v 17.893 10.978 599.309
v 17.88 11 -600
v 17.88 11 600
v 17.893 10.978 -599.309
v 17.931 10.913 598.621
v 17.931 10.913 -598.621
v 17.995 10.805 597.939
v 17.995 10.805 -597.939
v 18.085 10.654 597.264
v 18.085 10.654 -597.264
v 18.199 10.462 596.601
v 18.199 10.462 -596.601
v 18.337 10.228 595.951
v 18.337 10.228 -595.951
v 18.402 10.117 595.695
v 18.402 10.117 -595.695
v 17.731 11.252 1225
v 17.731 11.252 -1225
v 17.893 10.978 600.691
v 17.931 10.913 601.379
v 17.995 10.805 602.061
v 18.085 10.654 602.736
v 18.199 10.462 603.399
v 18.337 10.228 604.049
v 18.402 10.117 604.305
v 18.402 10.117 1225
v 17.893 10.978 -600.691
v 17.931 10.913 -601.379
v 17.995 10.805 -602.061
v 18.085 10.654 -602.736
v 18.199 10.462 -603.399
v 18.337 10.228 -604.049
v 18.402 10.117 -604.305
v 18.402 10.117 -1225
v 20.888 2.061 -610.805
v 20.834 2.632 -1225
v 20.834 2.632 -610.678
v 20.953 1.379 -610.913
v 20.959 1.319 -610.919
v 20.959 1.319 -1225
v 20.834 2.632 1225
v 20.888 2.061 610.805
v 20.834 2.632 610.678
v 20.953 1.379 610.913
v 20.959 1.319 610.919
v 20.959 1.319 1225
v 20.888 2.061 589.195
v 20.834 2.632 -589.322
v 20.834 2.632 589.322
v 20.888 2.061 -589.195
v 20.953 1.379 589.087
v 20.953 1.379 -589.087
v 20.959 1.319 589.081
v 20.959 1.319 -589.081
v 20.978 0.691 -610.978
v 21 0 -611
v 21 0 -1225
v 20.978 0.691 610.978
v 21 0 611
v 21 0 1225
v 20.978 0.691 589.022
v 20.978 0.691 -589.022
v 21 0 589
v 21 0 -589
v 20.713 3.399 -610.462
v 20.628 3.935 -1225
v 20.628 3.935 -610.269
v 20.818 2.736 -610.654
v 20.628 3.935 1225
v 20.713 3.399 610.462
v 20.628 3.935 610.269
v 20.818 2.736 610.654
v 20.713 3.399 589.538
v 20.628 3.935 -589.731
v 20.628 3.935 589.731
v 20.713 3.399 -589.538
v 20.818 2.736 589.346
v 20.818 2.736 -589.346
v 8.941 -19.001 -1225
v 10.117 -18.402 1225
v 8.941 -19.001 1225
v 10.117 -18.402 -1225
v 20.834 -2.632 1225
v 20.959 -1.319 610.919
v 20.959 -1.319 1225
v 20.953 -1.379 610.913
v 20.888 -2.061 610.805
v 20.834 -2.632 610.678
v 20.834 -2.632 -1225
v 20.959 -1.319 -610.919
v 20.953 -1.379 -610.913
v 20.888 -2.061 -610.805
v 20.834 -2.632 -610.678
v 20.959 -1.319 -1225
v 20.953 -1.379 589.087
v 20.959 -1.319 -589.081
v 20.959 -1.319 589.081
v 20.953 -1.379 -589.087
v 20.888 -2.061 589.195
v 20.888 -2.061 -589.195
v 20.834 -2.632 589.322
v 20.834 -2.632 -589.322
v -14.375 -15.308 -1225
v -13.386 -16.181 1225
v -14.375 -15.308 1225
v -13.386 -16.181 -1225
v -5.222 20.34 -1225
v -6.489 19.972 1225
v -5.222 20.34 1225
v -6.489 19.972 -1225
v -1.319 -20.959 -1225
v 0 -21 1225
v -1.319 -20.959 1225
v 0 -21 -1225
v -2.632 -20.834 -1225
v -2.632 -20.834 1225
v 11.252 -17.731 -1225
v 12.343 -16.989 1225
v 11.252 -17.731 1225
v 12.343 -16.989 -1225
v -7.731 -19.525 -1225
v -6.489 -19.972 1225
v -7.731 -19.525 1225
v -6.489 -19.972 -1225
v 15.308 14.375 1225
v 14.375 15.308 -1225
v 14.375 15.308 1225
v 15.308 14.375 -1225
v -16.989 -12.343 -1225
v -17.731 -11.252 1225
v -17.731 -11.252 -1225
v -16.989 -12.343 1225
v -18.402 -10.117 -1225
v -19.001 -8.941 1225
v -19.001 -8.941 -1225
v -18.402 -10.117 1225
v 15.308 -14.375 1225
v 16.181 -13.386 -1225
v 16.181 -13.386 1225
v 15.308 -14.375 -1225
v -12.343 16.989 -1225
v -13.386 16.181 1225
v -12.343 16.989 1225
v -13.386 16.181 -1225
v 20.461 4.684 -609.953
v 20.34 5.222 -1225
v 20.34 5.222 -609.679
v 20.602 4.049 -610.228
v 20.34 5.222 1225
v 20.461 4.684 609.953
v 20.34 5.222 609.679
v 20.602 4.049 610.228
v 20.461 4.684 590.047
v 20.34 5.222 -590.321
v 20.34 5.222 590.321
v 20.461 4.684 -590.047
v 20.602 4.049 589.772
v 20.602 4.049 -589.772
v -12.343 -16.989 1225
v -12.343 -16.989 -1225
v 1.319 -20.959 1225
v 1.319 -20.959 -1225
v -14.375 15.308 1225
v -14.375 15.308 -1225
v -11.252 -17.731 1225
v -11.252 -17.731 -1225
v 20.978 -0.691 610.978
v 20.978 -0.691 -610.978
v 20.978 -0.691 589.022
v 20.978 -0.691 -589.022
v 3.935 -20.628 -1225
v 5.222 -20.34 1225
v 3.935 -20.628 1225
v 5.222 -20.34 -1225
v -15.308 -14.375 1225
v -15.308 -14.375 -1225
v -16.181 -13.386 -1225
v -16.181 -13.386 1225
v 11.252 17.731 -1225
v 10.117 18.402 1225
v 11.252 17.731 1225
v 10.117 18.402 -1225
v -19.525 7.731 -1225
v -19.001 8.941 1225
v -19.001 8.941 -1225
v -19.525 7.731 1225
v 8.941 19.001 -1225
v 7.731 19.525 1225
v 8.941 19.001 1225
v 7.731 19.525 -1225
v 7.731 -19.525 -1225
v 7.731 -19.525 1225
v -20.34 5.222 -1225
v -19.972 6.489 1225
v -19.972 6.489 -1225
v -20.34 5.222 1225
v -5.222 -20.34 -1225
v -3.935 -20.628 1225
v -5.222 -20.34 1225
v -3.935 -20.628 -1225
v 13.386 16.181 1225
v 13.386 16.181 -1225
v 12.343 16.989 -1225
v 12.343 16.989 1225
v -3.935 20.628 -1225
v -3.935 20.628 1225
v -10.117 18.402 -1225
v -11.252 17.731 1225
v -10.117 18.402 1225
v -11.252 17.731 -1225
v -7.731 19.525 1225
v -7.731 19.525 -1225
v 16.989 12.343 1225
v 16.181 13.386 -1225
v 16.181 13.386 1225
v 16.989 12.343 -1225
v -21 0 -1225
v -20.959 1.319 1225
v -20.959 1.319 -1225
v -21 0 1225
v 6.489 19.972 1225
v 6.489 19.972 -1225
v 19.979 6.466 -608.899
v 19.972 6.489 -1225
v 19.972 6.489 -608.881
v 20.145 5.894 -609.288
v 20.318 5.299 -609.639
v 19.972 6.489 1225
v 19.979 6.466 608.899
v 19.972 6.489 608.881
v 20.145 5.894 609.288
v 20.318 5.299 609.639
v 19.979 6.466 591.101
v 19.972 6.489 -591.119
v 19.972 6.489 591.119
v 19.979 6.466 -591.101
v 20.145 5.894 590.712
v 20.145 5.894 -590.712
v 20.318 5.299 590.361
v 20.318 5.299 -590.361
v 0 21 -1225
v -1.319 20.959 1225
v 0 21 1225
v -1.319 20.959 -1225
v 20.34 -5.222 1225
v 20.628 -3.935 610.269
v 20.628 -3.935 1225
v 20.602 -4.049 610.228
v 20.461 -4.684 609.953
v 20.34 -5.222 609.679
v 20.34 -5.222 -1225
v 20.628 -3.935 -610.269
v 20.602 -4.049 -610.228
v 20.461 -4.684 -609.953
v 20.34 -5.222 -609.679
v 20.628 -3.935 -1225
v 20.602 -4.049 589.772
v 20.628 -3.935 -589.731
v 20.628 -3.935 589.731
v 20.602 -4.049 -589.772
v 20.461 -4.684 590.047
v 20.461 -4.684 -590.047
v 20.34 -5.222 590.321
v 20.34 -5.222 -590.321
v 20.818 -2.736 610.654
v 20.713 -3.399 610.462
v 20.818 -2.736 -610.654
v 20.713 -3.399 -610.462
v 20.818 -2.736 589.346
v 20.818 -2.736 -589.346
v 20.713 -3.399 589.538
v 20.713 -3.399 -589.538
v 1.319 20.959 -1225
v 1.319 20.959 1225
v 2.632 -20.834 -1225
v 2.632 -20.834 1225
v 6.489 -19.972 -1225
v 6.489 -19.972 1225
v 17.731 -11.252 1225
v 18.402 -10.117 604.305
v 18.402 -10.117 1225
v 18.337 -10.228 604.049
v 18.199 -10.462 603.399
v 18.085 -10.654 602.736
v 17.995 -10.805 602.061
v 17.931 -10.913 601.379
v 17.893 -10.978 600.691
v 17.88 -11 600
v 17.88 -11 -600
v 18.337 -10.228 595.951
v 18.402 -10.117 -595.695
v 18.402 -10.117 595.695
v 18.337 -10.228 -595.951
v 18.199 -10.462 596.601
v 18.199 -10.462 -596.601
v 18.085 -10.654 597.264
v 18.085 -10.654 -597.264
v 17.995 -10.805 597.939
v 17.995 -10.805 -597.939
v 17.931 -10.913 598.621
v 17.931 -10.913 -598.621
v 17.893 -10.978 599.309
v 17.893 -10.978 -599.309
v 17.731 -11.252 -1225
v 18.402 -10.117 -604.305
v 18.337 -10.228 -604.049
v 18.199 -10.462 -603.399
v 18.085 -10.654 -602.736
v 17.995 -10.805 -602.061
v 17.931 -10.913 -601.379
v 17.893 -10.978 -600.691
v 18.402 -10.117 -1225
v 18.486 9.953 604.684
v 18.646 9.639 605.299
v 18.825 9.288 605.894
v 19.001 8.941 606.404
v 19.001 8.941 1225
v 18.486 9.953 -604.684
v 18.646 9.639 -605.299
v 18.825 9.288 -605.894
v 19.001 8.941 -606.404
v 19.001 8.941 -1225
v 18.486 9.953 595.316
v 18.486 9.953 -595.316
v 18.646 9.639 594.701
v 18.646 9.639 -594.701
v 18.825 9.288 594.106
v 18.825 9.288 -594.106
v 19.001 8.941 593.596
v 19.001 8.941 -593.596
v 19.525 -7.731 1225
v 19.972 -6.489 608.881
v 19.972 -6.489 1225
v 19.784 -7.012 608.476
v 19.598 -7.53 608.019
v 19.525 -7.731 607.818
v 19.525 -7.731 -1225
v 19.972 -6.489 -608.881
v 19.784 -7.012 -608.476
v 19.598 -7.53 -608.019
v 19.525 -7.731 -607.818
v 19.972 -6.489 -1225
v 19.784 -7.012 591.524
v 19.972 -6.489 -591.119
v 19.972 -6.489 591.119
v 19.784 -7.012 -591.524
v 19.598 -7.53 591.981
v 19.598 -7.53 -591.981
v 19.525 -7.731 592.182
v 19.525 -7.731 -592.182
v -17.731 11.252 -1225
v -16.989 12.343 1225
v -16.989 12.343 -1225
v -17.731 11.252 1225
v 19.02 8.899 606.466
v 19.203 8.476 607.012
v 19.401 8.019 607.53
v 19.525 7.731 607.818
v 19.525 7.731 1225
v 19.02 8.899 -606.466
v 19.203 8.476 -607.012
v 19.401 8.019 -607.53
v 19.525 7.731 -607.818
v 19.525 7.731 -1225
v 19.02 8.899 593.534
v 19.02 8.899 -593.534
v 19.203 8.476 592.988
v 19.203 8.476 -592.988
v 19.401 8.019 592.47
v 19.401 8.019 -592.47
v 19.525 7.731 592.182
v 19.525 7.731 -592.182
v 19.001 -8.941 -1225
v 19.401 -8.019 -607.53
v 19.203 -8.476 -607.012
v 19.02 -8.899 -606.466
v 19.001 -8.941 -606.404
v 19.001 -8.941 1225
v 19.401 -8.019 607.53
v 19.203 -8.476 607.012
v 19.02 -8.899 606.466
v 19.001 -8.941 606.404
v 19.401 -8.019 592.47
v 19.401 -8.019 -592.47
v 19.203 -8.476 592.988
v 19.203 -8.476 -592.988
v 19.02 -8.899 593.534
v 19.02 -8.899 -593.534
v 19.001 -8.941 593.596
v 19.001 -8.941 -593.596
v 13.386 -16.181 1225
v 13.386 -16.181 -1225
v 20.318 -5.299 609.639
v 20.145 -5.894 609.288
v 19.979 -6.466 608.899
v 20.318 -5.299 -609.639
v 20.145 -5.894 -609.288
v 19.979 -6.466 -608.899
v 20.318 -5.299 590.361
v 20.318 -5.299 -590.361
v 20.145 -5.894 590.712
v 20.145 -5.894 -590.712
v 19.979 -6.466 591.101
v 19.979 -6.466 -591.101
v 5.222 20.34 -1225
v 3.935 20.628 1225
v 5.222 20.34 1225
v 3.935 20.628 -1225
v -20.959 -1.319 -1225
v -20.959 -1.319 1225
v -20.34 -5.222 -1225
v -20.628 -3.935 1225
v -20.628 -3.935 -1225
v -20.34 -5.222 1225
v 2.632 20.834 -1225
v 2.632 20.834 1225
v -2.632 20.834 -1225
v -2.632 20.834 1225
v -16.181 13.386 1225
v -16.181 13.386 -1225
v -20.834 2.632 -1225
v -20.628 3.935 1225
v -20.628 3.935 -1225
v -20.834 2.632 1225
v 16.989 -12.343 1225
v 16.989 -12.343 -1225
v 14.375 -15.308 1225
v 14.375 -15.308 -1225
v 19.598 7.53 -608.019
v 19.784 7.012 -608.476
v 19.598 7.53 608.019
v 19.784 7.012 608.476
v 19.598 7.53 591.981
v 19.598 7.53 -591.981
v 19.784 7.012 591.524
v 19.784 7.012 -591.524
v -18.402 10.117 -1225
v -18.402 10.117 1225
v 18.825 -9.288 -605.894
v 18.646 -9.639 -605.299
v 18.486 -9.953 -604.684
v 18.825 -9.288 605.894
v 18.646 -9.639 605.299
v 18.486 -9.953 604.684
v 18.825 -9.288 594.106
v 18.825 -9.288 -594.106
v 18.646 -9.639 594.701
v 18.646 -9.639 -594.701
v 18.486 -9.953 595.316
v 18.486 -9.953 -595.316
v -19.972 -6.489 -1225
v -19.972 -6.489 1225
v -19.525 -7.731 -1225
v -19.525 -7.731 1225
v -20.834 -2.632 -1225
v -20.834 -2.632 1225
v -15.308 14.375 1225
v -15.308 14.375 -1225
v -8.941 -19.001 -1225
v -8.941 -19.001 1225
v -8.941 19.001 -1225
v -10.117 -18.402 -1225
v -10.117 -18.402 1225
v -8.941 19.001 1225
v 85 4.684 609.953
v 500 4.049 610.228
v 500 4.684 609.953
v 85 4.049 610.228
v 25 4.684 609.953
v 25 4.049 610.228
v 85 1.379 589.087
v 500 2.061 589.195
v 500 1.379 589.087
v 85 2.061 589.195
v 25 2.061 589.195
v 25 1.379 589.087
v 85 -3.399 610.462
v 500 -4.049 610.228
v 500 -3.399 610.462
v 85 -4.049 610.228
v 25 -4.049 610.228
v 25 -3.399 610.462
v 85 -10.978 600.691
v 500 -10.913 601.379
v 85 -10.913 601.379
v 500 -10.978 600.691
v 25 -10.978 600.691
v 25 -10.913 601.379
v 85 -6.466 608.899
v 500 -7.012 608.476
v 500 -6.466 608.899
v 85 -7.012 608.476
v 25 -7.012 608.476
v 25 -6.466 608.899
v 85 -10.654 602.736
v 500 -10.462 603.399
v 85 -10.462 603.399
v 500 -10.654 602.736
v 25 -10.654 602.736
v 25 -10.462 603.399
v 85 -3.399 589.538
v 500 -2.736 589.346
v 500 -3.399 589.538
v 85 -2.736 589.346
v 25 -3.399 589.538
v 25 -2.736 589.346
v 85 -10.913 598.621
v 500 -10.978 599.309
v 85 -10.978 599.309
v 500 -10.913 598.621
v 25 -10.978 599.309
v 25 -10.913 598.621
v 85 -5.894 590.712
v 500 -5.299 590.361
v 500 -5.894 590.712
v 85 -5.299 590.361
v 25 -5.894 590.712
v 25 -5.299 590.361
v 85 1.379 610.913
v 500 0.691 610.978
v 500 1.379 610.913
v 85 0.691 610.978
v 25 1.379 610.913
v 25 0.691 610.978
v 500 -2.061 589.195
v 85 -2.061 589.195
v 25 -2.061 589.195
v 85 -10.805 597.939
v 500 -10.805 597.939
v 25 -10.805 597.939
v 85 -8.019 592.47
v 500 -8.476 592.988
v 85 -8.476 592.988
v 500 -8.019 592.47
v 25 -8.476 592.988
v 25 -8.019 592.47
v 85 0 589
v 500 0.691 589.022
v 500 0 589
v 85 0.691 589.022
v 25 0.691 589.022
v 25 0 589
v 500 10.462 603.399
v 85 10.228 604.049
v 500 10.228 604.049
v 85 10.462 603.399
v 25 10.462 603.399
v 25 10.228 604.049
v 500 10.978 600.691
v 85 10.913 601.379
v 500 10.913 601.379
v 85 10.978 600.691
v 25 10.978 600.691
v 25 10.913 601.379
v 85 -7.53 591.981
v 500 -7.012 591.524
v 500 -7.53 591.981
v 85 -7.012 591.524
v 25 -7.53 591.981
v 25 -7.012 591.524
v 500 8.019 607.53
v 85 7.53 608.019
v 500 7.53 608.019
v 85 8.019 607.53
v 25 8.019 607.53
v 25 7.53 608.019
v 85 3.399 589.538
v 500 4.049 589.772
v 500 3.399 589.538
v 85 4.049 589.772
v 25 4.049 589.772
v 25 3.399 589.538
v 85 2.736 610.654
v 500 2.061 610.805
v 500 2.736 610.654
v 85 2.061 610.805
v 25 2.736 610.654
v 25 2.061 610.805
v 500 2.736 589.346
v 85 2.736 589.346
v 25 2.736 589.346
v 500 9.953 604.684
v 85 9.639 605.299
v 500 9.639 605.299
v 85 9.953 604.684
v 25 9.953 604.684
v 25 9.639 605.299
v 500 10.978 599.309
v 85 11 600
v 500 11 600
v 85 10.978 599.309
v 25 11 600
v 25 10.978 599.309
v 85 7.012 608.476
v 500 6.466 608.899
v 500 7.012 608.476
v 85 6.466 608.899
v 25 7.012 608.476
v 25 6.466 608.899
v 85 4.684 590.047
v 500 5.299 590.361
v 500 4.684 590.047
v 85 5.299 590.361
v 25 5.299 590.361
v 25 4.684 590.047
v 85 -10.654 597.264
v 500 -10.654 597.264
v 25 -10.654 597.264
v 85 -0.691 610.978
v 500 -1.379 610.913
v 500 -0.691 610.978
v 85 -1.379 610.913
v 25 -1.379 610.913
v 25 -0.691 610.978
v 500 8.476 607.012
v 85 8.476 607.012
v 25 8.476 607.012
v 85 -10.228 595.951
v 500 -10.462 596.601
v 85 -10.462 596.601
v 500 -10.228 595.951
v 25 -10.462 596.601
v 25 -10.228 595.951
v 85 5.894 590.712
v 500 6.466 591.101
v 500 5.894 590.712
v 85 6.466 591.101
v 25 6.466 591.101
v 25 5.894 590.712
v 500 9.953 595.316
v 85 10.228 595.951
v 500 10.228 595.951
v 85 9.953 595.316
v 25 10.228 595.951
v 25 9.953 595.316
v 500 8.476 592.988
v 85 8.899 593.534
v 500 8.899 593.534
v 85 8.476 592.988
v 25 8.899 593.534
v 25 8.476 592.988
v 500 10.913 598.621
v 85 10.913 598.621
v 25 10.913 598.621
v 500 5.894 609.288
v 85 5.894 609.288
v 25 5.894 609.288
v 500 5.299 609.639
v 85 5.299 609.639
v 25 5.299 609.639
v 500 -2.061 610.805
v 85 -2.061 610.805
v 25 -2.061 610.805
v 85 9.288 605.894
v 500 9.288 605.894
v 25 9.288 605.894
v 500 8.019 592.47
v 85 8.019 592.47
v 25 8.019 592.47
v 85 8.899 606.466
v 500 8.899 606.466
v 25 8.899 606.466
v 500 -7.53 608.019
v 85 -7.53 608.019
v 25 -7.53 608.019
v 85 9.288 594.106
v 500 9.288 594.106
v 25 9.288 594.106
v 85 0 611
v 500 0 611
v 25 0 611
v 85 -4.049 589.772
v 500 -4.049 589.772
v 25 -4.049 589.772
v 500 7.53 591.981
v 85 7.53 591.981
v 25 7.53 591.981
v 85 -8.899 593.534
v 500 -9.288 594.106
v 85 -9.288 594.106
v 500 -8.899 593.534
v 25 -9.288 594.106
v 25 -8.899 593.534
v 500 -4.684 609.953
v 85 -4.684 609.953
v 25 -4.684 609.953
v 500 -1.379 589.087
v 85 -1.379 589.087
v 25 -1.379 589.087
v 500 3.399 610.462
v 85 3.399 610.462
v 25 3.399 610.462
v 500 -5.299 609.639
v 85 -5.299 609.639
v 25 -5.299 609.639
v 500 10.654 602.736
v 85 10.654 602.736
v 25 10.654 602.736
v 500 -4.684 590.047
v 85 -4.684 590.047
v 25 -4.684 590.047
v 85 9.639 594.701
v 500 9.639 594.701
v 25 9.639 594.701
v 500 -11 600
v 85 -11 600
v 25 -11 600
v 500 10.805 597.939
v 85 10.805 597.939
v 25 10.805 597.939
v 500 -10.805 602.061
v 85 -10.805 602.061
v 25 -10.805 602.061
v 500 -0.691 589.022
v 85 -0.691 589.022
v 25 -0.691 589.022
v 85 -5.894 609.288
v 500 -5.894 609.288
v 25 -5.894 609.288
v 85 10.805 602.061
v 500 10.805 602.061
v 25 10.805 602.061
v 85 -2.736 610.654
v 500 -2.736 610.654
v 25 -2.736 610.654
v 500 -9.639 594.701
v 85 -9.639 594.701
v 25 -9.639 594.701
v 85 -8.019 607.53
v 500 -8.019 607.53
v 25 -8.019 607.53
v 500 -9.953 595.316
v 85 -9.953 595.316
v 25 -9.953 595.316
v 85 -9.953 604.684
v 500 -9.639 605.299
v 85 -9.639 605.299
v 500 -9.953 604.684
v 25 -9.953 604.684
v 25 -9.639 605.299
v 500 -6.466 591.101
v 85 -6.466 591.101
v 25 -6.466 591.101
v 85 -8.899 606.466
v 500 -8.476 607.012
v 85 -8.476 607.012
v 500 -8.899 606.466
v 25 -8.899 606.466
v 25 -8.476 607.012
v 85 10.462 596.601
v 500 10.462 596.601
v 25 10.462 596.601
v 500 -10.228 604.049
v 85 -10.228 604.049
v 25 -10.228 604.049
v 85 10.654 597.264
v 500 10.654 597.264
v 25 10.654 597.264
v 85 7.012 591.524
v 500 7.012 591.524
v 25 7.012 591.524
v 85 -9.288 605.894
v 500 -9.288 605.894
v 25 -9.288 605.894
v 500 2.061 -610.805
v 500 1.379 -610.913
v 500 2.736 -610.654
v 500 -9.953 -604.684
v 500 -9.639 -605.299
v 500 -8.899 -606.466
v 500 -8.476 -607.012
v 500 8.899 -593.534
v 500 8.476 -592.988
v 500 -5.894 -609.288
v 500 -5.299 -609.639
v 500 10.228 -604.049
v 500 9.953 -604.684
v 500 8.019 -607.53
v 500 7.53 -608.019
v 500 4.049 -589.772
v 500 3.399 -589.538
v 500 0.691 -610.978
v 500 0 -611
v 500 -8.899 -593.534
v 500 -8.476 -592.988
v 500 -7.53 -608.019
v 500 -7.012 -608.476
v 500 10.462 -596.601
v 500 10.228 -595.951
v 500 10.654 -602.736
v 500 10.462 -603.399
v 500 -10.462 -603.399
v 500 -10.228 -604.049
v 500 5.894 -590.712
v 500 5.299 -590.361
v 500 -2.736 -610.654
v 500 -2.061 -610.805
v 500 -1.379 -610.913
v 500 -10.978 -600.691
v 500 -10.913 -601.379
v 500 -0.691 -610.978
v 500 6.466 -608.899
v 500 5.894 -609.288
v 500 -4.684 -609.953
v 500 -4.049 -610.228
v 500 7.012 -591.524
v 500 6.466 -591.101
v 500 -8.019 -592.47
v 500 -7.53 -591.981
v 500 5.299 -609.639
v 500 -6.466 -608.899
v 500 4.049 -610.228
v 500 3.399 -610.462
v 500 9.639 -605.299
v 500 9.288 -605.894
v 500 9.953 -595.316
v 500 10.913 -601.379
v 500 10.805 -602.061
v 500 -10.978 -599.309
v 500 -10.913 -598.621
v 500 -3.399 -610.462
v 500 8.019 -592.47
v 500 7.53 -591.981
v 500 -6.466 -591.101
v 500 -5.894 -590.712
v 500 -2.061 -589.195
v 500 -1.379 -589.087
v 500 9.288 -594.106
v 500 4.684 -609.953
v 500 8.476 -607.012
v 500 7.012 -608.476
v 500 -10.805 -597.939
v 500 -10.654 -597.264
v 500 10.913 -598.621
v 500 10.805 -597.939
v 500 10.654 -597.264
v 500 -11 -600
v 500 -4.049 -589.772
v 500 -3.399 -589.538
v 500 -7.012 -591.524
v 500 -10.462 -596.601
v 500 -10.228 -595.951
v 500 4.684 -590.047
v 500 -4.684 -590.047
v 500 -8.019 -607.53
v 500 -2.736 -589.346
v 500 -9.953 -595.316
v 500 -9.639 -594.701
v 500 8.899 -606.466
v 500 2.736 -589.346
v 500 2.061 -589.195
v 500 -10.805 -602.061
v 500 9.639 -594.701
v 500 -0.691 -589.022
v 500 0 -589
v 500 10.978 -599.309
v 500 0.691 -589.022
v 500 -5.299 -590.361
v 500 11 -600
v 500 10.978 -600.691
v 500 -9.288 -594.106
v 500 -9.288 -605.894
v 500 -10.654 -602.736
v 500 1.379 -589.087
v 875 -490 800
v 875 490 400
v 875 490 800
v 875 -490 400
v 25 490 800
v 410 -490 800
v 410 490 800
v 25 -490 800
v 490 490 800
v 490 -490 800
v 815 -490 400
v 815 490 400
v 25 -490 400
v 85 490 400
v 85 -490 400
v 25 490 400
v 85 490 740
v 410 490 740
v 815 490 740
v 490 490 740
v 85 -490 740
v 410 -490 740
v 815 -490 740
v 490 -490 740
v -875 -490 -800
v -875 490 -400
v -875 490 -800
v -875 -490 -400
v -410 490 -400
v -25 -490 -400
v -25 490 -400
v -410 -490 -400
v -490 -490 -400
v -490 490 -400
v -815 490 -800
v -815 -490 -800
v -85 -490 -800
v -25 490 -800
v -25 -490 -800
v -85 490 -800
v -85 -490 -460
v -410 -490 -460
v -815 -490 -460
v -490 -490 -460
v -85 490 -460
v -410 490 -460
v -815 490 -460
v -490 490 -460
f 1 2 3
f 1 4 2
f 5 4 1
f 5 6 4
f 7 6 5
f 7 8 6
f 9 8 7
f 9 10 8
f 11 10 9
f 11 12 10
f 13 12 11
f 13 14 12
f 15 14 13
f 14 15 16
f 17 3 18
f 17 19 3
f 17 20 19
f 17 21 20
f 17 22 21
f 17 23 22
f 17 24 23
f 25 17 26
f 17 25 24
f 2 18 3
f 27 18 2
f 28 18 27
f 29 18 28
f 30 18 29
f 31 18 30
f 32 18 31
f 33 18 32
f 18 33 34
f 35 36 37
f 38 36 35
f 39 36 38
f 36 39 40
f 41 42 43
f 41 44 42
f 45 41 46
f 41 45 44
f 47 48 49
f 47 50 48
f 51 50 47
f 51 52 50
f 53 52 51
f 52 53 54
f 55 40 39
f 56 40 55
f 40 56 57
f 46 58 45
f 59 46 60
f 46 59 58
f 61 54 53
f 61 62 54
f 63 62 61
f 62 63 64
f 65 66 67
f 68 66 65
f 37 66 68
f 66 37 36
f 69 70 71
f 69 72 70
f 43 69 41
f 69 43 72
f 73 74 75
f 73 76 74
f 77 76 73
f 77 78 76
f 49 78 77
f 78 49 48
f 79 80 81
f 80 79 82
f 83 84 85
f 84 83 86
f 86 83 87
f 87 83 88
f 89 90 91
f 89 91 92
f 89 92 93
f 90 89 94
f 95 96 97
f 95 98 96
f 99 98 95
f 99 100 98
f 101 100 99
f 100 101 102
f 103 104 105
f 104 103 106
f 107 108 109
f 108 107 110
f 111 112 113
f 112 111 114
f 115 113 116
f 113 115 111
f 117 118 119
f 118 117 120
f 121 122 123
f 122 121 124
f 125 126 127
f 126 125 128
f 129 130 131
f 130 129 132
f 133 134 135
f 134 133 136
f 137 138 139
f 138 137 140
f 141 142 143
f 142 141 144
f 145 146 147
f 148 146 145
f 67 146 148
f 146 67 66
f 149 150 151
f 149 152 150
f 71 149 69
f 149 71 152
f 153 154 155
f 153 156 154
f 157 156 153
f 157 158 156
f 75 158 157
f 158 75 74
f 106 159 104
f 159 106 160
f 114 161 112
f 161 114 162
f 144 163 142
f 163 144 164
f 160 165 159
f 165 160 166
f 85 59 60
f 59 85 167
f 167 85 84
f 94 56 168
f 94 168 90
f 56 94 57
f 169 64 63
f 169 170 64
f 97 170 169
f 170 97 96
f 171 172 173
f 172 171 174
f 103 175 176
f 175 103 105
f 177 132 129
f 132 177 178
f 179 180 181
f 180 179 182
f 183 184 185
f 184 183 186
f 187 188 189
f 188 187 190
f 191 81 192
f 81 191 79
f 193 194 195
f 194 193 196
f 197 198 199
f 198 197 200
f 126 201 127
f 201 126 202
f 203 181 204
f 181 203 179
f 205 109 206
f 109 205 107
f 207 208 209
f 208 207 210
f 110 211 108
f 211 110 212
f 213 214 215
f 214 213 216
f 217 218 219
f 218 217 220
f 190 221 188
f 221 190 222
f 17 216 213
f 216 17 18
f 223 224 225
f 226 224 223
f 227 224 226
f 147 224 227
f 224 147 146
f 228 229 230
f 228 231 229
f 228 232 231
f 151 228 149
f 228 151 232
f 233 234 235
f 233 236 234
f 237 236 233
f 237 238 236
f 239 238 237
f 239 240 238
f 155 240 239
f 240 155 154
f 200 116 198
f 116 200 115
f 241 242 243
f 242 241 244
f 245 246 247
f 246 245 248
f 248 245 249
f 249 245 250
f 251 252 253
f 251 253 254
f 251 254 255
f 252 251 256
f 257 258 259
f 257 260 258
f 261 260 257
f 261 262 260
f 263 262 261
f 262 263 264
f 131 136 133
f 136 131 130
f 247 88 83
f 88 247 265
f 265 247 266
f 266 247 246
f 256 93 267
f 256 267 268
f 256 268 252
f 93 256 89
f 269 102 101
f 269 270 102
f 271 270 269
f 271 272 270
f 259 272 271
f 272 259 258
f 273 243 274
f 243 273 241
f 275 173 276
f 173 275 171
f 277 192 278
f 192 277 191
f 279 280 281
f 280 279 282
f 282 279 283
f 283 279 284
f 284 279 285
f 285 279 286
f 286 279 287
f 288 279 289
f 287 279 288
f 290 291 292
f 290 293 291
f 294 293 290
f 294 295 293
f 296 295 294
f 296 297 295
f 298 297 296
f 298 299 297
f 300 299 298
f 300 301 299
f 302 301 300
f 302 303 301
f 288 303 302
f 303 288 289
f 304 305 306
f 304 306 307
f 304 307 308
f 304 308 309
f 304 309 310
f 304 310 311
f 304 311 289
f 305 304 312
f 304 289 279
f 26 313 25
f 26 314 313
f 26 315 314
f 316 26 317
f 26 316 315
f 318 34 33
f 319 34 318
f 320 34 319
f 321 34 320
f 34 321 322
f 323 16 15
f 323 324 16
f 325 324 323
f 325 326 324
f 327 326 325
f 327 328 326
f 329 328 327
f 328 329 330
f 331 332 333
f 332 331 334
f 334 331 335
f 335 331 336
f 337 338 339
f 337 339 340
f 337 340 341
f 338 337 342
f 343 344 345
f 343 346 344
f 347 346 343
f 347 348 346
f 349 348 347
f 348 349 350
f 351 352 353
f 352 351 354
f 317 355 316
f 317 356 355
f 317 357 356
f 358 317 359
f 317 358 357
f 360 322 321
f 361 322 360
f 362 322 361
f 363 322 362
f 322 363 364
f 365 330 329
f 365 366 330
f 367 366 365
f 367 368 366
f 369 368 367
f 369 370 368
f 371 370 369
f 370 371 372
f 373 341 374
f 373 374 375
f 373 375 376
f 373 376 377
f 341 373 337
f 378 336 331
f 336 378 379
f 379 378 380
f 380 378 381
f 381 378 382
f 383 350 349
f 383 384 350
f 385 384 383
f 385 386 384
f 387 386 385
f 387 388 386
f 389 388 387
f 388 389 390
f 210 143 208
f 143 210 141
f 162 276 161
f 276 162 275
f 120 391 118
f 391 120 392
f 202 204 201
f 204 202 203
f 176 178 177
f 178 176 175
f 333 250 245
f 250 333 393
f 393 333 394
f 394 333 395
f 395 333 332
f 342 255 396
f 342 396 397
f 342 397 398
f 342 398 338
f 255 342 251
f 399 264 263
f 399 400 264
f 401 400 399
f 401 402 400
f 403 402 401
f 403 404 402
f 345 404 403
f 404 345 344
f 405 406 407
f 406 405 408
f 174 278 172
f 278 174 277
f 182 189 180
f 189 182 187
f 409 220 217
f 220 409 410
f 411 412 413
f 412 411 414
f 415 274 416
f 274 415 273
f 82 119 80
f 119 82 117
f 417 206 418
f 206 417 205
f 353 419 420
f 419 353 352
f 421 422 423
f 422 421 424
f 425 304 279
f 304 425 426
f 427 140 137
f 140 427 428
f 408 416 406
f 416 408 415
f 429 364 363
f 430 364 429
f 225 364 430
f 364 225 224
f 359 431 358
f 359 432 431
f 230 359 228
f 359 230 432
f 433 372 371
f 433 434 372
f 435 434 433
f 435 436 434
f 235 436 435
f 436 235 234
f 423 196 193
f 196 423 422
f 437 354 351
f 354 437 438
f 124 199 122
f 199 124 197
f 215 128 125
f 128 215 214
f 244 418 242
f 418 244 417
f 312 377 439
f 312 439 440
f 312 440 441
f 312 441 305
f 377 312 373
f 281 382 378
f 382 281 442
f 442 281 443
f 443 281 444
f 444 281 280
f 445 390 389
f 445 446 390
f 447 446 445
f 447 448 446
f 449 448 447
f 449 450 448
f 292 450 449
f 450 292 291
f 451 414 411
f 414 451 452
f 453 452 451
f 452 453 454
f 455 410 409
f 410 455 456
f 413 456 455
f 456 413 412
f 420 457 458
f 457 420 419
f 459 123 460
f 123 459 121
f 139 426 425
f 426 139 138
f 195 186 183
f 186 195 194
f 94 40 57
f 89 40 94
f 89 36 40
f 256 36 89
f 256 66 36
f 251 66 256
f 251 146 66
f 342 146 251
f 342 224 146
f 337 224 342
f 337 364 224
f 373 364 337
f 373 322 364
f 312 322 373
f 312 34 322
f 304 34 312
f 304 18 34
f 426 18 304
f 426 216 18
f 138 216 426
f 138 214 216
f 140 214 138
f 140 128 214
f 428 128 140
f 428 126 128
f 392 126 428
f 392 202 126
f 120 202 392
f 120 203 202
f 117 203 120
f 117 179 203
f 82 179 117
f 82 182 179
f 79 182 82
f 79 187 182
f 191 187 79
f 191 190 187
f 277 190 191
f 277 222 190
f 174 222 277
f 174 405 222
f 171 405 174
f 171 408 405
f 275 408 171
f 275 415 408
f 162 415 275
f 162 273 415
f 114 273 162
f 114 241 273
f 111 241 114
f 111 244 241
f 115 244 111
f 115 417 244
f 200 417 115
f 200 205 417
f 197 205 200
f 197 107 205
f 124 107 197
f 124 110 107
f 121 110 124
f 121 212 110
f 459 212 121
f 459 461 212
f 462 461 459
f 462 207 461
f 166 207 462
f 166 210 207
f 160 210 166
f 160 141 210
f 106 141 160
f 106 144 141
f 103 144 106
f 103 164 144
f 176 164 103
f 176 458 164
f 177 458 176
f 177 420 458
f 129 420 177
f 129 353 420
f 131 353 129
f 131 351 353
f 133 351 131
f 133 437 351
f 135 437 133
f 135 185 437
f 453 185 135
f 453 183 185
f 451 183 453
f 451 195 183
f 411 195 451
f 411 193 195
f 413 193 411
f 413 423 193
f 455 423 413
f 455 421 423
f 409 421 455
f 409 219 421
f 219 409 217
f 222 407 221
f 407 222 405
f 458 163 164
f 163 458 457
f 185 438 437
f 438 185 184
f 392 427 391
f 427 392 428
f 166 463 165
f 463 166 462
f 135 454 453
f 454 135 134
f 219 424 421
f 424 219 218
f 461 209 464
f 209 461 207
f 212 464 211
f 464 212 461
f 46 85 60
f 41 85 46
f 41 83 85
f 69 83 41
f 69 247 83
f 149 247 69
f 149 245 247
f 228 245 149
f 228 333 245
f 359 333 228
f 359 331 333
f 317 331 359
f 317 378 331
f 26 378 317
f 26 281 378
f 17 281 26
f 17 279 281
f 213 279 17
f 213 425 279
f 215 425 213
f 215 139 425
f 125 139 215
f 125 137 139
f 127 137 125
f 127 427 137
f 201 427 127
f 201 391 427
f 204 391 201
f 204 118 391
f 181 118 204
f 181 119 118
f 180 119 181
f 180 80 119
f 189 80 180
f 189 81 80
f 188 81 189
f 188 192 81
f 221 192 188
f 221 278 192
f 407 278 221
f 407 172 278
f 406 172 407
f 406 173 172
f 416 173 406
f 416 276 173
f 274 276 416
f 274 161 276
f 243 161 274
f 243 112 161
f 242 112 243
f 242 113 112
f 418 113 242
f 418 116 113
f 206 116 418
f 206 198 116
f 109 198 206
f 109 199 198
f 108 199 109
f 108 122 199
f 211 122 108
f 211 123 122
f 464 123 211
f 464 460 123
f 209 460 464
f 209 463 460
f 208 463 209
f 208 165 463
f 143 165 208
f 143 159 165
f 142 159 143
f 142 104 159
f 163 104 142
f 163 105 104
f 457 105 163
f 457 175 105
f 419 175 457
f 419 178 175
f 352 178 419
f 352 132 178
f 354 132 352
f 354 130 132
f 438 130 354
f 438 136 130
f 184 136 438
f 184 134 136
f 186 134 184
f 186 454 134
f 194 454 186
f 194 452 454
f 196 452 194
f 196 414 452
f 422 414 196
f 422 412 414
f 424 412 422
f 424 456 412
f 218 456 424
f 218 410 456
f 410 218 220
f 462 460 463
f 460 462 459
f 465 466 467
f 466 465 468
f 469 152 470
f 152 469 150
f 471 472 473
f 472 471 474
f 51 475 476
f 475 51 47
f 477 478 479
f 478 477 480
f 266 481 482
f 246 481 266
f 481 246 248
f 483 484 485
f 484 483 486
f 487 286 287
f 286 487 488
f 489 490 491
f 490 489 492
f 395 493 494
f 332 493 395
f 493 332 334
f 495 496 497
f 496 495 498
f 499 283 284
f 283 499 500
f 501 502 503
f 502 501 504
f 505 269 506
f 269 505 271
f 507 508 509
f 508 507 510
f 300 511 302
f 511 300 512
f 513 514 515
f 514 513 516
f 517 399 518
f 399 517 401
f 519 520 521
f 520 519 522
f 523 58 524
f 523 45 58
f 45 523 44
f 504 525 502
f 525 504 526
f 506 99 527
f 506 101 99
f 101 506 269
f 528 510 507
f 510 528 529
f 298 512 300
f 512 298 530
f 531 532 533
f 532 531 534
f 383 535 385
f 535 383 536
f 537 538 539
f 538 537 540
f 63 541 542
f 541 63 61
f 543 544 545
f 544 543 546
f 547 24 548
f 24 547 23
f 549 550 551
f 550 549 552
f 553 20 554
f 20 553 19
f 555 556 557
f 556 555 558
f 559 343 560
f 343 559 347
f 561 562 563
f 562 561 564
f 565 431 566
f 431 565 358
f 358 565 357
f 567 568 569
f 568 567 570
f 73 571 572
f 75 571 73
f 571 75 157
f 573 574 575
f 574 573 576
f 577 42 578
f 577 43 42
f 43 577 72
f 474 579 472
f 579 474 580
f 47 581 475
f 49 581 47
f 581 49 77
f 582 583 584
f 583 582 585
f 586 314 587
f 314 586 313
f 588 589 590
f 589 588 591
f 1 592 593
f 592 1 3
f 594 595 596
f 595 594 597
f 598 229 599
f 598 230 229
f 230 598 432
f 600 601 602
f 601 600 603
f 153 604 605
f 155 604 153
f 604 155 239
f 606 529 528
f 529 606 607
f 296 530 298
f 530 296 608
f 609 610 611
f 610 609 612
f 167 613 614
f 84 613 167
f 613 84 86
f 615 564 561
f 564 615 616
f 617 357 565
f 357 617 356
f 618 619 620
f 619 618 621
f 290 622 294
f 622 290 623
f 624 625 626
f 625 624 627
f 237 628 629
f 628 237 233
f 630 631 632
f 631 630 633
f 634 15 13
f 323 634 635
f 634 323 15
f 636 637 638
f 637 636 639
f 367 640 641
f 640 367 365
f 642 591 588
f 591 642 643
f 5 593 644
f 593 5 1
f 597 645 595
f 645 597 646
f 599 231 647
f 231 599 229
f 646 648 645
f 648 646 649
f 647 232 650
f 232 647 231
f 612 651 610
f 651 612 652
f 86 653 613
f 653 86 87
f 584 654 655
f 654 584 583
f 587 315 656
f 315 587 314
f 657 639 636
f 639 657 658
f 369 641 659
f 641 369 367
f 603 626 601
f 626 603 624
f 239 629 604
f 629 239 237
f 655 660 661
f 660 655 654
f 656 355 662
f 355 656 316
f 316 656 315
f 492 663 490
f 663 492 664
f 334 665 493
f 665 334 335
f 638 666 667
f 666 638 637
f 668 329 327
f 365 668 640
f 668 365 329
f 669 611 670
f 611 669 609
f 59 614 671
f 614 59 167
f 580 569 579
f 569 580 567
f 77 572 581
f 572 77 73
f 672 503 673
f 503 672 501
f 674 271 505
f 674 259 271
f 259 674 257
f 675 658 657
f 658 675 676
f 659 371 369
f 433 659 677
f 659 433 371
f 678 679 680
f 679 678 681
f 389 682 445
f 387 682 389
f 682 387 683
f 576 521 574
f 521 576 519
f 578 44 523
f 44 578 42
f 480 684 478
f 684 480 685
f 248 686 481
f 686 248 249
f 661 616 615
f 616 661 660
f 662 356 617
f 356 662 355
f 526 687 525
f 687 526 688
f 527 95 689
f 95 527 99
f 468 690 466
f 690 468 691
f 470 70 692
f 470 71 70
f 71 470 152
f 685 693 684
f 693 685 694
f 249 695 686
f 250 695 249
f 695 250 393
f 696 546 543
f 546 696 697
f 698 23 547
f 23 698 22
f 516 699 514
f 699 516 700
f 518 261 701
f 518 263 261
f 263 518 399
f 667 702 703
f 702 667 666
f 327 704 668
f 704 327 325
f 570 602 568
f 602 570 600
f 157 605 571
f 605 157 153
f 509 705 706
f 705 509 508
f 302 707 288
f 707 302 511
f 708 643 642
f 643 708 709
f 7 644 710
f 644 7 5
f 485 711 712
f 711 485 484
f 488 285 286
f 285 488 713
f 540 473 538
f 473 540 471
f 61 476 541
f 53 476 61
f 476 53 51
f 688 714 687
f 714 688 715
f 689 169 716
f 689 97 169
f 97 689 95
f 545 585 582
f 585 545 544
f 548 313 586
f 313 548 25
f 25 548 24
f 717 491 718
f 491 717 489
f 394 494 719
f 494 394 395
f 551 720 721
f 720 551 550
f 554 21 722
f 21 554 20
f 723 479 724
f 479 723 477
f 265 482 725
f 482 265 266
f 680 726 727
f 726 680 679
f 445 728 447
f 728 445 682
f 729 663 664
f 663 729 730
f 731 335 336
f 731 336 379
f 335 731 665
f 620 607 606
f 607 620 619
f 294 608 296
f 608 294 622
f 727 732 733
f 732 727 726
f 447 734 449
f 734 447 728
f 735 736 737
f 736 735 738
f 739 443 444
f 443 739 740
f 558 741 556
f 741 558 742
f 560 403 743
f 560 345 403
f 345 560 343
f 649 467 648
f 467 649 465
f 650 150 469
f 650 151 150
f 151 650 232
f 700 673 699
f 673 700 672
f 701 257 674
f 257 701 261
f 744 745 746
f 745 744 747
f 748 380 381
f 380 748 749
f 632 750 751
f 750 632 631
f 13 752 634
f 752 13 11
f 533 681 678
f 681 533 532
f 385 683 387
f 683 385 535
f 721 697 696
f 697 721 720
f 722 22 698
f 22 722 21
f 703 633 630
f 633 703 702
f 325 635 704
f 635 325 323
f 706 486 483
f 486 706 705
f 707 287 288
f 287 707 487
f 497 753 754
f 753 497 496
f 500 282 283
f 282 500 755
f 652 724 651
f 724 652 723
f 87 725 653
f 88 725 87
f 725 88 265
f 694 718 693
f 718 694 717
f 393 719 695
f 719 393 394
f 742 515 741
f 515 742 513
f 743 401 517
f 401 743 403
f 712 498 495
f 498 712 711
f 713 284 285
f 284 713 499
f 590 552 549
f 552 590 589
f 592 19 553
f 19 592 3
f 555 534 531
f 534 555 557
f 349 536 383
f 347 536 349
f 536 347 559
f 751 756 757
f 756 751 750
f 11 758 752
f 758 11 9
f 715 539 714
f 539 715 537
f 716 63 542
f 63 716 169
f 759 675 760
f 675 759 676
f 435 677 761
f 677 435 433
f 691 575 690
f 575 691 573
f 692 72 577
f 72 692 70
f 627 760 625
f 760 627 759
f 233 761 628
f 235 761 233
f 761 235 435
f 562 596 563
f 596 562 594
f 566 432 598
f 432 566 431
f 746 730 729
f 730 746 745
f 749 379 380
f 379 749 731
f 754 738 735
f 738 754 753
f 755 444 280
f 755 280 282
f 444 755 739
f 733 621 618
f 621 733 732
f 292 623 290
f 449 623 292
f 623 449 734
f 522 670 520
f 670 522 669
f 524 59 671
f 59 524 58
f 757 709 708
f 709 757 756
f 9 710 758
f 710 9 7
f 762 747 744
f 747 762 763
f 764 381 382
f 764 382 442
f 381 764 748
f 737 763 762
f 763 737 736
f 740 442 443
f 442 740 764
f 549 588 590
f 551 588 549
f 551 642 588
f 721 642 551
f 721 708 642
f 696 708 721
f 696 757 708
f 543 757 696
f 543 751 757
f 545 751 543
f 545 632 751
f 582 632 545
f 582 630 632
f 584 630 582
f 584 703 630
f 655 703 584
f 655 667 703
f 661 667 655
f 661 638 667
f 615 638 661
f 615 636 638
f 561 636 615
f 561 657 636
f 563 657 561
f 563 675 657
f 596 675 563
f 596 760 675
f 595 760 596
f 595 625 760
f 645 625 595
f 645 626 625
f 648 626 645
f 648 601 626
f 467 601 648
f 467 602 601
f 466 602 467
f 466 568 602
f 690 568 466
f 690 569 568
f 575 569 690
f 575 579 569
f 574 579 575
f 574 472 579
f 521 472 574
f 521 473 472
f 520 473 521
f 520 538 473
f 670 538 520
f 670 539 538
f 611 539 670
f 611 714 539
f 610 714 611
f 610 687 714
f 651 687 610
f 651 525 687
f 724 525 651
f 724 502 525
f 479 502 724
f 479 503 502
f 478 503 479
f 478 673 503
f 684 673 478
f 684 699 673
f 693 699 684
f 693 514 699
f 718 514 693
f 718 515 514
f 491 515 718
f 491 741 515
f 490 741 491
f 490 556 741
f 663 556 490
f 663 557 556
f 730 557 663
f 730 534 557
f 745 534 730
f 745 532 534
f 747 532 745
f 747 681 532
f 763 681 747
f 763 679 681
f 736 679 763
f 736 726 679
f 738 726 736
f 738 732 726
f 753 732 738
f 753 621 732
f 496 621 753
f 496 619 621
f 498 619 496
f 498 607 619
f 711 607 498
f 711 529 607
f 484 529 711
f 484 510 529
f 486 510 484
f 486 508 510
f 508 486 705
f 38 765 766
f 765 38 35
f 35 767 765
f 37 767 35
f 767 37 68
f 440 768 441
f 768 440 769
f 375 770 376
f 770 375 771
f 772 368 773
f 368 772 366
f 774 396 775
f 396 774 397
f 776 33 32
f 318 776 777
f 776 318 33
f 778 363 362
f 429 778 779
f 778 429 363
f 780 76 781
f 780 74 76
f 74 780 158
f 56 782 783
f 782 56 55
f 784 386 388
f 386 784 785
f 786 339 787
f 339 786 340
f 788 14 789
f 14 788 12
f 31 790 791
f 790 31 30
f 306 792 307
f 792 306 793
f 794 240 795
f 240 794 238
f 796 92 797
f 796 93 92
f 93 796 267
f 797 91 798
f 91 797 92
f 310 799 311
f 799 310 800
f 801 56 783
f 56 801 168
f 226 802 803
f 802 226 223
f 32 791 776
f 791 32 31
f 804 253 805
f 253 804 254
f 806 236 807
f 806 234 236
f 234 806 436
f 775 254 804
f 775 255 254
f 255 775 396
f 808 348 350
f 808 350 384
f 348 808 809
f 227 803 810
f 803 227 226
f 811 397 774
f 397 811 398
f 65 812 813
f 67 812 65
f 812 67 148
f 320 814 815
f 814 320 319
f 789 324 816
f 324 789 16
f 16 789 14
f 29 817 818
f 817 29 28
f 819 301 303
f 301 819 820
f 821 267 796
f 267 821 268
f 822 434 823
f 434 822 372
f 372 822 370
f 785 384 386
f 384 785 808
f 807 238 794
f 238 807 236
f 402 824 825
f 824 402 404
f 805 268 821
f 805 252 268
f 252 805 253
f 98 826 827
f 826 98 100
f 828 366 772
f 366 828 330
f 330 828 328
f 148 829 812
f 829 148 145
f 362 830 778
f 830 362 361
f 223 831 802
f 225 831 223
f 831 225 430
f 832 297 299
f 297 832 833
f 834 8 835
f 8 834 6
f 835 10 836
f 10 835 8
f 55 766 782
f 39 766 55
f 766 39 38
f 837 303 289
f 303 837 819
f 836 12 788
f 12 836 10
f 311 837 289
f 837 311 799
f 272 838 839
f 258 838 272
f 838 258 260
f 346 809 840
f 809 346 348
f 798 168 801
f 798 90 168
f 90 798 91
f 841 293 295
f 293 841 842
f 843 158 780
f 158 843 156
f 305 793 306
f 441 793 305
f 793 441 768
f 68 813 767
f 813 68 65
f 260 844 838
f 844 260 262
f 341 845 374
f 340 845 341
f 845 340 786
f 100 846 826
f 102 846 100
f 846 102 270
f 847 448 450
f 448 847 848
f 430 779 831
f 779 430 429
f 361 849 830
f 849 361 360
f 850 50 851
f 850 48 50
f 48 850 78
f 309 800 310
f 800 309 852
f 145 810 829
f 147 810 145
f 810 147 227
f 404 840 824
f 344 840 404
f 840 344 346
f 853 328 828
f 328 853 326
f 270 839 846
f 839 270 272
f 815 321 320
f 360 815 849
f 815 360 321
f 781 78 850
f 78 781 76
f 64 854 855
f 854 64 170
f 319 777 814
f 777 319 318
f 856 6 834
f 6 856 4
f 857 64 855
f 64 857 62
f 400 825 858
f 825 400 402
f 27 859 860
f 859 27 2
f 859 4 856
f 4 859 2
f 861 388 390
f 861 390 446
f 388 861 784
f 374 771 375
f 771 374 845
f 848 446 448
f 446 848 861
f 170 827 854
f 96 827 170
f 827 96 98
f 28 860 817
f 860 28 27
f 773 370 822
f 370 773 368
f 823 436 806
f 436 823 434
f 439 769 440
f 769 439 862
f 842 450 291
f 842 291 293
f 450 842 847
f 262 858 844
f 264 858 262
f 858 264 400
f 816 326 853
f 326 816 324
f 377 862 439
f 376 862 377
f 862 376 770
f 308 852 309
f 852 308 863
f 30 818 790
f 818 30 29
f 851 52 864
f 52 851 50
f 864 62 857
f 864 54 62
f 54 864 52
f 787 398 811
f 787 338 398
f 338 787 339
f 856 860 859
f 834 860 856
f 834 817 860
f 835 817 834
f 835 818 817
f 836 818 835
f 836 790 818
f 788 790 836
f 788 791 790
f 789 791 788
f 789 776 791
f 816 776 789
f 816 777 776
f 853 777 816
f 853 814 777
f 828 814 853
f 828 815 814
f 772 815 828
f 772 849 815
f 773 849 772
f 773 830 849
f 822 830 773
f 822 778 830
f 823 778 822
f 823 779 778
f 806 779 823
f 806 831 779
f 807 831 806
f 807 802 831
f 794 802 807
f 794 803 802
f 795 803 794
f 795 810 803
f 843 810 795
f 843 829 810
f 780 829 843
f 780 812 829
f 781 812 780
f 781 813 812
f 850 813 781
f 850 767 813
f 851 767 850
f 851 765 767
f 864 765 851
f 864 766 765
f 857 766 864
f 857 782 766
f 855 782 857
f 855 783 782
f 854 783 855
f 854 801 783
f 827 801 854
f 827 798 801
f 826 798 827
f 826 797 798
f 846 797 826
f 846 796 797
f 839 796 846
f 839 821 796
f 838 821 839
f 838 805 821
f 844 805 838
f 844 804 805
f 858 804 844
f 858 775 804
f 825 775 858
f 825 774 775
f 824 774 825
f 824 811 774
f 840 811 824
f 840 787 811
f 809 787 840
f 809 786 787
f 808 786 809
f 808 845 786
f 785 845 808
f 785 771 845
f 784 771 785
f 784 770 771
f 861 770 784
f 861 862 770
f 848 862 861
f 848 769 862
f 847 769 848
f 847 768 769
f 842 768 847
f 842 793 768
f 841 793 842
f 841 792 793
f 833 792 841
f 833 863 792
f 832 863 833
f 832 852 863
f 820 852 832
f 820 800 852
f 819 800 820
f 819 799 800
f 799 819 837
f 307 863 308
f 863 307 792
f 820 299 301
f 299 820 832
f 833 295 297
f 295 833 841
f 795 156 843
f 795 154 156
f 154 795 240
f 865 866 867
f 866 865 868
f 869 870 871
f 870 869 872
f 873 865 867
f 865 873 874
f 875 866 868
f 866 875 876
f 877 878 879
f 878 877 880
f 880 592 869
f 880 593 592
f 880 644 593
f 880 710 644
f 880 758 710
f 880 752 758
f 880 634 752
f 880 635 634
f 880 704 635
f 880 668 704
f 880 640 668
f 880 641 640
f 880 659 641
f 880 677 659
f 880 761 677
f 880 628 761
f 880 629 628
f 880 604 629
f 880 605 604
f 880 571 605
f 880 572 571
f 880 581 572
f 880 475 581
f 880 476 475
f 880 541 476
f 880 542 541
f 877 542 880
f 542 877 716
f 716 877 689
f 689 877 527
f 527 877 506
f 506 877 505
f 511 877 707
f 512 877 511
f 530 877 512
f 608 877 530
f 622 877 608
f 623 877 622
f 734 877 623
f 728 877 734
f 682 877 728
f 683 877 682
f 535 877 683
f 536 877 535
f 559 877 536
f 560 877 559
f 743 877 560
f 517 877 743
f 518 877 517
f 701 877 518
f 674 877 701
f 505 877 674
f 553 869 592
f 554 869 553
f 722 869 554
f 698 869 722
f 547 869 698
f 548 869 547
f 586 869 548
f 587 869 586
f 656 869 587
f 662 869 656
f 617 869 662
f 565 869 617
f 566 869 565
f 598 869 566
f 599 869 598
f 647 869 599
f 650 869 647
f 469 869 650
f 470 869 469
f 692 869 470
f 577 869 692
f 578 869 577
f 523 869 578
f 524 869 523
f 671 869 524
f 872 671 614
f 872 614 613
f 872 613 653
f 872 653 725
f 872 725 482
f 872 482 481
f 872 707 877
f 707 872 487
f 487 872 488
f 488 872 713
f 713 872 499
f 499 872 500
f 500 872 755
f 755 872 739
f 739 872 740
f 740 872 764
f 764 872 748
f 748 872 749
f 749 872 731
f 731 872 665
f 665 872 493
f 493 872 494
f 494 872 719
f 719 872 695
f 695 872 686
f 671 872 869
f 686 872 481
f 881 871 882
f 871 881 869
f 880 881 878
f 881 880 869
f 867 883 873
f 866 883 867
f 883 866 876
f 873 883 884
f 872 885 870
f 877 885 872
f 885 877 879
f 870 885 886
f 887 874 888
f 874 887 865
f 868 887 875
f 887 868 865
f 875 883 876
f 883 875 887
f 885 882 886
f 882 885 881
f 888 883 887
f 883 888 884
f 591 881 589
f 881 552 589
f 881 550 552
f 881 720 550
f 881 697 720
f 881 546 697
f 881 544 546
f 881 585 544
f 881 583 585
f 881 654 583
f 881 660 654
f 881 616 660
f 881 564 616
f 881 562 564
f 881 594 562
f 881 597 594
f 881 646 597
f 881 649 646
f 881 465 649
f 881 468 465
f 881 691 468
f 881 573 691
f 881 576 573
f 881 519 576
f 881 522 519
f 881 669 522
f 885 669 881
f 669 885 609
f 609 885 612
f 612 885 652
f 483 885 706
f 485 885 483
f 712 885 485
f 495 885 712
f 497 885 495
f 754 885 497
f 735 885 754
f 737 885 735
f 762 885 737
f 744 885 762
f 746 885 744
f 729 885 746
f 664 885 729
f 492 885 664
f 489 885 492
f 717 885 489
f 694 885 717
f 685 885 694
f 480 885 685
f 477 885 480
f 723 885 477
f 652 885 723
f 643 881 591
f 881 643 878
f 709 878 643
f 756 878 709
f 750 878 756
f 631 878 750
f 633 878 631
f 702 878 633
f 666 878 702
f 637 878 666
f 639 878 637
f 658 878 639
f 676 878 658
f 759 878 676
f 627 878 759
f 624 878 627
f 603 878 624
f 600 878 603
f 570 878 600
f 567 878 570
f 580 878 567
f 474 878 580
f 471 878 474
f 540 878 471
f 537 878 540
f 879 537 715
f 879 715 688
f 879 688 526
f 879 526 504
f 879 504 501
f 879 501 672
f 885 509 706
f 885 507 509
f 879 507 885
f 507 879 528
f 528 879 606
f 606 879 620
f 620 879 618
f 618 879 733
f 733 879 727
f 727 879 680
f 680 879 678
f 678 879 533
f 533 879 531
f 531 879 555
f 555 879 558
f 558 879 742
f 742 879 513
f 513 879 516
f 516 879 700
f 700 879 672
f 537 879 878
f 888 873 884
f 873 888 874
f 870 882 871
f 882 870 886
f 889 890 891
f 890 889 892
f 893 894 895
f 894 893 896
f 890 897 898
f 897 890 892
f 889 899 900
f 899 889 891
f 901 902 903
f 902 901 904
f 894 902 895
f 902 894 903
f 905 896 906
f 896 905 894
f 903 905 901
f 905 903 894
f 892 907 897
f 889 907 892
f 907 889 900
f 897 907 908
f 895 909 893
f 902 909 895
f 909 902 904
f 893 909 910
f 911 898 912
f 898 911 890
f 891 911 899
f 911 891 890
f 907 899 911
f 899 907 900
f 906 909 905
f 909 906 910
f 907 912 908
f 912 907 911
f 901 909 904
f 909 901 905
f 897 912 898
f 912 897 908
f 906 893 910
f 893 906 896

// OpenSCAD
// ============================================================================
// PROJECT: XXXG-00W0 WING GUNDAM ZERO EW - GROUND FOOTPRINT VAULT
// COMPONENT VAULT: BANDAI CAST RUNNER A - DISTAL TOE GUARDS A25 & A26
// ENGINEERING STANDARD: DOTE COMPLIANCE WITH 5,200 Nm HIP TORQUE ARRAYS
// STRUCTURAL MATRIX: BIOCHEM-5000 NON-LINEAR LOAD DISSIPATION ANCHORS
// ============================================================================

$fn = 100; // Circular segment fidelity segment count

// Sizing Constants Scaled 1:1 for a 16.7-Meter Airframe Envelope (mm)
toe_guard_length = 980;                 // Total longitudinal toe block forward axis (mm)
toe_guard_width = 850;                  // Total transverse ground anchor footing width (mm)
armor_skin_thickness = 60;              // Variable TiAl defensive plating wall (mm)
harness_conduit_width = 80;             // Embedded 4oz copper logic rail track (mm)
anchor_tooth_depth = 110;               // Non-linear torque stabilization teeth (mm)

module Runner_A_Toe_Forge() {
    // Central Supply Injection Runner Axis (Molten Feed Line from Siphon Forge)
    color([0.22, 0.22, 0.24]) {
        cylinder(h = toe_guard_length * 2.5, d = 42, center = true);
        // Direct injection gates tracking straight into the part mold cavities
        translate([0, 0, 600]) rotate([0, 90, 0]) cylinder(h = 500, d = 22);
        translate([0, 0, -600]) rotate([0, 90, 0]) cylinder(h = 500, d = 22);
    }
    
    // Instantiate Scaled Part Cavities (Replicating Manual Sprues exactly)
    Cast_Distal_Toe_Stabilizers();
}

module Cast_Distal_Toe_Stabilizers() {
    // ---- PART A25: DISTAL LEFT TOE GUARD ARMOR SHELL ---- [Page 8, Step 9]
    translate([450, 0, 600]) color([0.8, 0.8, 0.85]) {
        difference() {
            // Main solid heavy-duty toe claw grounding housing block
            cube([toe_guard_width, toe_guard_length, 400], center = true);
            
            // Internal pocket clearance (Enforces the 60mm solid defensive wall)
            translate([0, 0, -armor_skin_thickness])
                cube([toe_guard_width - (armor_skin_thickness*2), toe_guard_length + 10, 400], center = true);
            
            // Sub-surface non-linear torque dissipation anchoring teeth
            for (offset = [-(toe_guard_width/3) : toe_guard_width/3 : toe_guard_width/3]) {
                translate([offset, (toe_guard_length/2 - anchor_tooth_depth/2), -150])
                    cube([70, anchor_tooth_depth + 10, 200], center = true);
            }
            
            // Cast-in guide slots to align the zero-wire copper harness logic rails
            cube([harness_conduit_width, toe_guard_length + 10, 500], center = true);
        }
    }
    
    // ---- PART A26: DISTAL RIGHT TOE GUARD ARMOR SHELL ---- [Page 8, Step 9]
    translate([-450, 0, -600]) rotate([0, 0, 180]) color([0.8, 0.8, 0.85]) {
        difference() {
            cube([toe_guard_width, toe_guard_length, 400], center = true);
            translate([0, 0, -armor_skin_thickness])
                cube([toe_guard_width - (armor_skin_thickness*2), toe_guard_length + 10, 400], center = true);
            for (offset = [-(toe_guard_width/3) : toe_guard_width/3 : toe_guard_width/3]) {
                translate([offset, (toe_guard_length/2 - anchor_tooth_depth/2), -150])
                    cube([70, anchor_tooth_depth + 10, 200], center = true);
            }
            cube([harness_conduit_width, toe_guard_length + 10, 500], center = true);
        }
    }
}

// Render Master Assembly to Parameter Workspace
Runner_A_Toe_Forge();
